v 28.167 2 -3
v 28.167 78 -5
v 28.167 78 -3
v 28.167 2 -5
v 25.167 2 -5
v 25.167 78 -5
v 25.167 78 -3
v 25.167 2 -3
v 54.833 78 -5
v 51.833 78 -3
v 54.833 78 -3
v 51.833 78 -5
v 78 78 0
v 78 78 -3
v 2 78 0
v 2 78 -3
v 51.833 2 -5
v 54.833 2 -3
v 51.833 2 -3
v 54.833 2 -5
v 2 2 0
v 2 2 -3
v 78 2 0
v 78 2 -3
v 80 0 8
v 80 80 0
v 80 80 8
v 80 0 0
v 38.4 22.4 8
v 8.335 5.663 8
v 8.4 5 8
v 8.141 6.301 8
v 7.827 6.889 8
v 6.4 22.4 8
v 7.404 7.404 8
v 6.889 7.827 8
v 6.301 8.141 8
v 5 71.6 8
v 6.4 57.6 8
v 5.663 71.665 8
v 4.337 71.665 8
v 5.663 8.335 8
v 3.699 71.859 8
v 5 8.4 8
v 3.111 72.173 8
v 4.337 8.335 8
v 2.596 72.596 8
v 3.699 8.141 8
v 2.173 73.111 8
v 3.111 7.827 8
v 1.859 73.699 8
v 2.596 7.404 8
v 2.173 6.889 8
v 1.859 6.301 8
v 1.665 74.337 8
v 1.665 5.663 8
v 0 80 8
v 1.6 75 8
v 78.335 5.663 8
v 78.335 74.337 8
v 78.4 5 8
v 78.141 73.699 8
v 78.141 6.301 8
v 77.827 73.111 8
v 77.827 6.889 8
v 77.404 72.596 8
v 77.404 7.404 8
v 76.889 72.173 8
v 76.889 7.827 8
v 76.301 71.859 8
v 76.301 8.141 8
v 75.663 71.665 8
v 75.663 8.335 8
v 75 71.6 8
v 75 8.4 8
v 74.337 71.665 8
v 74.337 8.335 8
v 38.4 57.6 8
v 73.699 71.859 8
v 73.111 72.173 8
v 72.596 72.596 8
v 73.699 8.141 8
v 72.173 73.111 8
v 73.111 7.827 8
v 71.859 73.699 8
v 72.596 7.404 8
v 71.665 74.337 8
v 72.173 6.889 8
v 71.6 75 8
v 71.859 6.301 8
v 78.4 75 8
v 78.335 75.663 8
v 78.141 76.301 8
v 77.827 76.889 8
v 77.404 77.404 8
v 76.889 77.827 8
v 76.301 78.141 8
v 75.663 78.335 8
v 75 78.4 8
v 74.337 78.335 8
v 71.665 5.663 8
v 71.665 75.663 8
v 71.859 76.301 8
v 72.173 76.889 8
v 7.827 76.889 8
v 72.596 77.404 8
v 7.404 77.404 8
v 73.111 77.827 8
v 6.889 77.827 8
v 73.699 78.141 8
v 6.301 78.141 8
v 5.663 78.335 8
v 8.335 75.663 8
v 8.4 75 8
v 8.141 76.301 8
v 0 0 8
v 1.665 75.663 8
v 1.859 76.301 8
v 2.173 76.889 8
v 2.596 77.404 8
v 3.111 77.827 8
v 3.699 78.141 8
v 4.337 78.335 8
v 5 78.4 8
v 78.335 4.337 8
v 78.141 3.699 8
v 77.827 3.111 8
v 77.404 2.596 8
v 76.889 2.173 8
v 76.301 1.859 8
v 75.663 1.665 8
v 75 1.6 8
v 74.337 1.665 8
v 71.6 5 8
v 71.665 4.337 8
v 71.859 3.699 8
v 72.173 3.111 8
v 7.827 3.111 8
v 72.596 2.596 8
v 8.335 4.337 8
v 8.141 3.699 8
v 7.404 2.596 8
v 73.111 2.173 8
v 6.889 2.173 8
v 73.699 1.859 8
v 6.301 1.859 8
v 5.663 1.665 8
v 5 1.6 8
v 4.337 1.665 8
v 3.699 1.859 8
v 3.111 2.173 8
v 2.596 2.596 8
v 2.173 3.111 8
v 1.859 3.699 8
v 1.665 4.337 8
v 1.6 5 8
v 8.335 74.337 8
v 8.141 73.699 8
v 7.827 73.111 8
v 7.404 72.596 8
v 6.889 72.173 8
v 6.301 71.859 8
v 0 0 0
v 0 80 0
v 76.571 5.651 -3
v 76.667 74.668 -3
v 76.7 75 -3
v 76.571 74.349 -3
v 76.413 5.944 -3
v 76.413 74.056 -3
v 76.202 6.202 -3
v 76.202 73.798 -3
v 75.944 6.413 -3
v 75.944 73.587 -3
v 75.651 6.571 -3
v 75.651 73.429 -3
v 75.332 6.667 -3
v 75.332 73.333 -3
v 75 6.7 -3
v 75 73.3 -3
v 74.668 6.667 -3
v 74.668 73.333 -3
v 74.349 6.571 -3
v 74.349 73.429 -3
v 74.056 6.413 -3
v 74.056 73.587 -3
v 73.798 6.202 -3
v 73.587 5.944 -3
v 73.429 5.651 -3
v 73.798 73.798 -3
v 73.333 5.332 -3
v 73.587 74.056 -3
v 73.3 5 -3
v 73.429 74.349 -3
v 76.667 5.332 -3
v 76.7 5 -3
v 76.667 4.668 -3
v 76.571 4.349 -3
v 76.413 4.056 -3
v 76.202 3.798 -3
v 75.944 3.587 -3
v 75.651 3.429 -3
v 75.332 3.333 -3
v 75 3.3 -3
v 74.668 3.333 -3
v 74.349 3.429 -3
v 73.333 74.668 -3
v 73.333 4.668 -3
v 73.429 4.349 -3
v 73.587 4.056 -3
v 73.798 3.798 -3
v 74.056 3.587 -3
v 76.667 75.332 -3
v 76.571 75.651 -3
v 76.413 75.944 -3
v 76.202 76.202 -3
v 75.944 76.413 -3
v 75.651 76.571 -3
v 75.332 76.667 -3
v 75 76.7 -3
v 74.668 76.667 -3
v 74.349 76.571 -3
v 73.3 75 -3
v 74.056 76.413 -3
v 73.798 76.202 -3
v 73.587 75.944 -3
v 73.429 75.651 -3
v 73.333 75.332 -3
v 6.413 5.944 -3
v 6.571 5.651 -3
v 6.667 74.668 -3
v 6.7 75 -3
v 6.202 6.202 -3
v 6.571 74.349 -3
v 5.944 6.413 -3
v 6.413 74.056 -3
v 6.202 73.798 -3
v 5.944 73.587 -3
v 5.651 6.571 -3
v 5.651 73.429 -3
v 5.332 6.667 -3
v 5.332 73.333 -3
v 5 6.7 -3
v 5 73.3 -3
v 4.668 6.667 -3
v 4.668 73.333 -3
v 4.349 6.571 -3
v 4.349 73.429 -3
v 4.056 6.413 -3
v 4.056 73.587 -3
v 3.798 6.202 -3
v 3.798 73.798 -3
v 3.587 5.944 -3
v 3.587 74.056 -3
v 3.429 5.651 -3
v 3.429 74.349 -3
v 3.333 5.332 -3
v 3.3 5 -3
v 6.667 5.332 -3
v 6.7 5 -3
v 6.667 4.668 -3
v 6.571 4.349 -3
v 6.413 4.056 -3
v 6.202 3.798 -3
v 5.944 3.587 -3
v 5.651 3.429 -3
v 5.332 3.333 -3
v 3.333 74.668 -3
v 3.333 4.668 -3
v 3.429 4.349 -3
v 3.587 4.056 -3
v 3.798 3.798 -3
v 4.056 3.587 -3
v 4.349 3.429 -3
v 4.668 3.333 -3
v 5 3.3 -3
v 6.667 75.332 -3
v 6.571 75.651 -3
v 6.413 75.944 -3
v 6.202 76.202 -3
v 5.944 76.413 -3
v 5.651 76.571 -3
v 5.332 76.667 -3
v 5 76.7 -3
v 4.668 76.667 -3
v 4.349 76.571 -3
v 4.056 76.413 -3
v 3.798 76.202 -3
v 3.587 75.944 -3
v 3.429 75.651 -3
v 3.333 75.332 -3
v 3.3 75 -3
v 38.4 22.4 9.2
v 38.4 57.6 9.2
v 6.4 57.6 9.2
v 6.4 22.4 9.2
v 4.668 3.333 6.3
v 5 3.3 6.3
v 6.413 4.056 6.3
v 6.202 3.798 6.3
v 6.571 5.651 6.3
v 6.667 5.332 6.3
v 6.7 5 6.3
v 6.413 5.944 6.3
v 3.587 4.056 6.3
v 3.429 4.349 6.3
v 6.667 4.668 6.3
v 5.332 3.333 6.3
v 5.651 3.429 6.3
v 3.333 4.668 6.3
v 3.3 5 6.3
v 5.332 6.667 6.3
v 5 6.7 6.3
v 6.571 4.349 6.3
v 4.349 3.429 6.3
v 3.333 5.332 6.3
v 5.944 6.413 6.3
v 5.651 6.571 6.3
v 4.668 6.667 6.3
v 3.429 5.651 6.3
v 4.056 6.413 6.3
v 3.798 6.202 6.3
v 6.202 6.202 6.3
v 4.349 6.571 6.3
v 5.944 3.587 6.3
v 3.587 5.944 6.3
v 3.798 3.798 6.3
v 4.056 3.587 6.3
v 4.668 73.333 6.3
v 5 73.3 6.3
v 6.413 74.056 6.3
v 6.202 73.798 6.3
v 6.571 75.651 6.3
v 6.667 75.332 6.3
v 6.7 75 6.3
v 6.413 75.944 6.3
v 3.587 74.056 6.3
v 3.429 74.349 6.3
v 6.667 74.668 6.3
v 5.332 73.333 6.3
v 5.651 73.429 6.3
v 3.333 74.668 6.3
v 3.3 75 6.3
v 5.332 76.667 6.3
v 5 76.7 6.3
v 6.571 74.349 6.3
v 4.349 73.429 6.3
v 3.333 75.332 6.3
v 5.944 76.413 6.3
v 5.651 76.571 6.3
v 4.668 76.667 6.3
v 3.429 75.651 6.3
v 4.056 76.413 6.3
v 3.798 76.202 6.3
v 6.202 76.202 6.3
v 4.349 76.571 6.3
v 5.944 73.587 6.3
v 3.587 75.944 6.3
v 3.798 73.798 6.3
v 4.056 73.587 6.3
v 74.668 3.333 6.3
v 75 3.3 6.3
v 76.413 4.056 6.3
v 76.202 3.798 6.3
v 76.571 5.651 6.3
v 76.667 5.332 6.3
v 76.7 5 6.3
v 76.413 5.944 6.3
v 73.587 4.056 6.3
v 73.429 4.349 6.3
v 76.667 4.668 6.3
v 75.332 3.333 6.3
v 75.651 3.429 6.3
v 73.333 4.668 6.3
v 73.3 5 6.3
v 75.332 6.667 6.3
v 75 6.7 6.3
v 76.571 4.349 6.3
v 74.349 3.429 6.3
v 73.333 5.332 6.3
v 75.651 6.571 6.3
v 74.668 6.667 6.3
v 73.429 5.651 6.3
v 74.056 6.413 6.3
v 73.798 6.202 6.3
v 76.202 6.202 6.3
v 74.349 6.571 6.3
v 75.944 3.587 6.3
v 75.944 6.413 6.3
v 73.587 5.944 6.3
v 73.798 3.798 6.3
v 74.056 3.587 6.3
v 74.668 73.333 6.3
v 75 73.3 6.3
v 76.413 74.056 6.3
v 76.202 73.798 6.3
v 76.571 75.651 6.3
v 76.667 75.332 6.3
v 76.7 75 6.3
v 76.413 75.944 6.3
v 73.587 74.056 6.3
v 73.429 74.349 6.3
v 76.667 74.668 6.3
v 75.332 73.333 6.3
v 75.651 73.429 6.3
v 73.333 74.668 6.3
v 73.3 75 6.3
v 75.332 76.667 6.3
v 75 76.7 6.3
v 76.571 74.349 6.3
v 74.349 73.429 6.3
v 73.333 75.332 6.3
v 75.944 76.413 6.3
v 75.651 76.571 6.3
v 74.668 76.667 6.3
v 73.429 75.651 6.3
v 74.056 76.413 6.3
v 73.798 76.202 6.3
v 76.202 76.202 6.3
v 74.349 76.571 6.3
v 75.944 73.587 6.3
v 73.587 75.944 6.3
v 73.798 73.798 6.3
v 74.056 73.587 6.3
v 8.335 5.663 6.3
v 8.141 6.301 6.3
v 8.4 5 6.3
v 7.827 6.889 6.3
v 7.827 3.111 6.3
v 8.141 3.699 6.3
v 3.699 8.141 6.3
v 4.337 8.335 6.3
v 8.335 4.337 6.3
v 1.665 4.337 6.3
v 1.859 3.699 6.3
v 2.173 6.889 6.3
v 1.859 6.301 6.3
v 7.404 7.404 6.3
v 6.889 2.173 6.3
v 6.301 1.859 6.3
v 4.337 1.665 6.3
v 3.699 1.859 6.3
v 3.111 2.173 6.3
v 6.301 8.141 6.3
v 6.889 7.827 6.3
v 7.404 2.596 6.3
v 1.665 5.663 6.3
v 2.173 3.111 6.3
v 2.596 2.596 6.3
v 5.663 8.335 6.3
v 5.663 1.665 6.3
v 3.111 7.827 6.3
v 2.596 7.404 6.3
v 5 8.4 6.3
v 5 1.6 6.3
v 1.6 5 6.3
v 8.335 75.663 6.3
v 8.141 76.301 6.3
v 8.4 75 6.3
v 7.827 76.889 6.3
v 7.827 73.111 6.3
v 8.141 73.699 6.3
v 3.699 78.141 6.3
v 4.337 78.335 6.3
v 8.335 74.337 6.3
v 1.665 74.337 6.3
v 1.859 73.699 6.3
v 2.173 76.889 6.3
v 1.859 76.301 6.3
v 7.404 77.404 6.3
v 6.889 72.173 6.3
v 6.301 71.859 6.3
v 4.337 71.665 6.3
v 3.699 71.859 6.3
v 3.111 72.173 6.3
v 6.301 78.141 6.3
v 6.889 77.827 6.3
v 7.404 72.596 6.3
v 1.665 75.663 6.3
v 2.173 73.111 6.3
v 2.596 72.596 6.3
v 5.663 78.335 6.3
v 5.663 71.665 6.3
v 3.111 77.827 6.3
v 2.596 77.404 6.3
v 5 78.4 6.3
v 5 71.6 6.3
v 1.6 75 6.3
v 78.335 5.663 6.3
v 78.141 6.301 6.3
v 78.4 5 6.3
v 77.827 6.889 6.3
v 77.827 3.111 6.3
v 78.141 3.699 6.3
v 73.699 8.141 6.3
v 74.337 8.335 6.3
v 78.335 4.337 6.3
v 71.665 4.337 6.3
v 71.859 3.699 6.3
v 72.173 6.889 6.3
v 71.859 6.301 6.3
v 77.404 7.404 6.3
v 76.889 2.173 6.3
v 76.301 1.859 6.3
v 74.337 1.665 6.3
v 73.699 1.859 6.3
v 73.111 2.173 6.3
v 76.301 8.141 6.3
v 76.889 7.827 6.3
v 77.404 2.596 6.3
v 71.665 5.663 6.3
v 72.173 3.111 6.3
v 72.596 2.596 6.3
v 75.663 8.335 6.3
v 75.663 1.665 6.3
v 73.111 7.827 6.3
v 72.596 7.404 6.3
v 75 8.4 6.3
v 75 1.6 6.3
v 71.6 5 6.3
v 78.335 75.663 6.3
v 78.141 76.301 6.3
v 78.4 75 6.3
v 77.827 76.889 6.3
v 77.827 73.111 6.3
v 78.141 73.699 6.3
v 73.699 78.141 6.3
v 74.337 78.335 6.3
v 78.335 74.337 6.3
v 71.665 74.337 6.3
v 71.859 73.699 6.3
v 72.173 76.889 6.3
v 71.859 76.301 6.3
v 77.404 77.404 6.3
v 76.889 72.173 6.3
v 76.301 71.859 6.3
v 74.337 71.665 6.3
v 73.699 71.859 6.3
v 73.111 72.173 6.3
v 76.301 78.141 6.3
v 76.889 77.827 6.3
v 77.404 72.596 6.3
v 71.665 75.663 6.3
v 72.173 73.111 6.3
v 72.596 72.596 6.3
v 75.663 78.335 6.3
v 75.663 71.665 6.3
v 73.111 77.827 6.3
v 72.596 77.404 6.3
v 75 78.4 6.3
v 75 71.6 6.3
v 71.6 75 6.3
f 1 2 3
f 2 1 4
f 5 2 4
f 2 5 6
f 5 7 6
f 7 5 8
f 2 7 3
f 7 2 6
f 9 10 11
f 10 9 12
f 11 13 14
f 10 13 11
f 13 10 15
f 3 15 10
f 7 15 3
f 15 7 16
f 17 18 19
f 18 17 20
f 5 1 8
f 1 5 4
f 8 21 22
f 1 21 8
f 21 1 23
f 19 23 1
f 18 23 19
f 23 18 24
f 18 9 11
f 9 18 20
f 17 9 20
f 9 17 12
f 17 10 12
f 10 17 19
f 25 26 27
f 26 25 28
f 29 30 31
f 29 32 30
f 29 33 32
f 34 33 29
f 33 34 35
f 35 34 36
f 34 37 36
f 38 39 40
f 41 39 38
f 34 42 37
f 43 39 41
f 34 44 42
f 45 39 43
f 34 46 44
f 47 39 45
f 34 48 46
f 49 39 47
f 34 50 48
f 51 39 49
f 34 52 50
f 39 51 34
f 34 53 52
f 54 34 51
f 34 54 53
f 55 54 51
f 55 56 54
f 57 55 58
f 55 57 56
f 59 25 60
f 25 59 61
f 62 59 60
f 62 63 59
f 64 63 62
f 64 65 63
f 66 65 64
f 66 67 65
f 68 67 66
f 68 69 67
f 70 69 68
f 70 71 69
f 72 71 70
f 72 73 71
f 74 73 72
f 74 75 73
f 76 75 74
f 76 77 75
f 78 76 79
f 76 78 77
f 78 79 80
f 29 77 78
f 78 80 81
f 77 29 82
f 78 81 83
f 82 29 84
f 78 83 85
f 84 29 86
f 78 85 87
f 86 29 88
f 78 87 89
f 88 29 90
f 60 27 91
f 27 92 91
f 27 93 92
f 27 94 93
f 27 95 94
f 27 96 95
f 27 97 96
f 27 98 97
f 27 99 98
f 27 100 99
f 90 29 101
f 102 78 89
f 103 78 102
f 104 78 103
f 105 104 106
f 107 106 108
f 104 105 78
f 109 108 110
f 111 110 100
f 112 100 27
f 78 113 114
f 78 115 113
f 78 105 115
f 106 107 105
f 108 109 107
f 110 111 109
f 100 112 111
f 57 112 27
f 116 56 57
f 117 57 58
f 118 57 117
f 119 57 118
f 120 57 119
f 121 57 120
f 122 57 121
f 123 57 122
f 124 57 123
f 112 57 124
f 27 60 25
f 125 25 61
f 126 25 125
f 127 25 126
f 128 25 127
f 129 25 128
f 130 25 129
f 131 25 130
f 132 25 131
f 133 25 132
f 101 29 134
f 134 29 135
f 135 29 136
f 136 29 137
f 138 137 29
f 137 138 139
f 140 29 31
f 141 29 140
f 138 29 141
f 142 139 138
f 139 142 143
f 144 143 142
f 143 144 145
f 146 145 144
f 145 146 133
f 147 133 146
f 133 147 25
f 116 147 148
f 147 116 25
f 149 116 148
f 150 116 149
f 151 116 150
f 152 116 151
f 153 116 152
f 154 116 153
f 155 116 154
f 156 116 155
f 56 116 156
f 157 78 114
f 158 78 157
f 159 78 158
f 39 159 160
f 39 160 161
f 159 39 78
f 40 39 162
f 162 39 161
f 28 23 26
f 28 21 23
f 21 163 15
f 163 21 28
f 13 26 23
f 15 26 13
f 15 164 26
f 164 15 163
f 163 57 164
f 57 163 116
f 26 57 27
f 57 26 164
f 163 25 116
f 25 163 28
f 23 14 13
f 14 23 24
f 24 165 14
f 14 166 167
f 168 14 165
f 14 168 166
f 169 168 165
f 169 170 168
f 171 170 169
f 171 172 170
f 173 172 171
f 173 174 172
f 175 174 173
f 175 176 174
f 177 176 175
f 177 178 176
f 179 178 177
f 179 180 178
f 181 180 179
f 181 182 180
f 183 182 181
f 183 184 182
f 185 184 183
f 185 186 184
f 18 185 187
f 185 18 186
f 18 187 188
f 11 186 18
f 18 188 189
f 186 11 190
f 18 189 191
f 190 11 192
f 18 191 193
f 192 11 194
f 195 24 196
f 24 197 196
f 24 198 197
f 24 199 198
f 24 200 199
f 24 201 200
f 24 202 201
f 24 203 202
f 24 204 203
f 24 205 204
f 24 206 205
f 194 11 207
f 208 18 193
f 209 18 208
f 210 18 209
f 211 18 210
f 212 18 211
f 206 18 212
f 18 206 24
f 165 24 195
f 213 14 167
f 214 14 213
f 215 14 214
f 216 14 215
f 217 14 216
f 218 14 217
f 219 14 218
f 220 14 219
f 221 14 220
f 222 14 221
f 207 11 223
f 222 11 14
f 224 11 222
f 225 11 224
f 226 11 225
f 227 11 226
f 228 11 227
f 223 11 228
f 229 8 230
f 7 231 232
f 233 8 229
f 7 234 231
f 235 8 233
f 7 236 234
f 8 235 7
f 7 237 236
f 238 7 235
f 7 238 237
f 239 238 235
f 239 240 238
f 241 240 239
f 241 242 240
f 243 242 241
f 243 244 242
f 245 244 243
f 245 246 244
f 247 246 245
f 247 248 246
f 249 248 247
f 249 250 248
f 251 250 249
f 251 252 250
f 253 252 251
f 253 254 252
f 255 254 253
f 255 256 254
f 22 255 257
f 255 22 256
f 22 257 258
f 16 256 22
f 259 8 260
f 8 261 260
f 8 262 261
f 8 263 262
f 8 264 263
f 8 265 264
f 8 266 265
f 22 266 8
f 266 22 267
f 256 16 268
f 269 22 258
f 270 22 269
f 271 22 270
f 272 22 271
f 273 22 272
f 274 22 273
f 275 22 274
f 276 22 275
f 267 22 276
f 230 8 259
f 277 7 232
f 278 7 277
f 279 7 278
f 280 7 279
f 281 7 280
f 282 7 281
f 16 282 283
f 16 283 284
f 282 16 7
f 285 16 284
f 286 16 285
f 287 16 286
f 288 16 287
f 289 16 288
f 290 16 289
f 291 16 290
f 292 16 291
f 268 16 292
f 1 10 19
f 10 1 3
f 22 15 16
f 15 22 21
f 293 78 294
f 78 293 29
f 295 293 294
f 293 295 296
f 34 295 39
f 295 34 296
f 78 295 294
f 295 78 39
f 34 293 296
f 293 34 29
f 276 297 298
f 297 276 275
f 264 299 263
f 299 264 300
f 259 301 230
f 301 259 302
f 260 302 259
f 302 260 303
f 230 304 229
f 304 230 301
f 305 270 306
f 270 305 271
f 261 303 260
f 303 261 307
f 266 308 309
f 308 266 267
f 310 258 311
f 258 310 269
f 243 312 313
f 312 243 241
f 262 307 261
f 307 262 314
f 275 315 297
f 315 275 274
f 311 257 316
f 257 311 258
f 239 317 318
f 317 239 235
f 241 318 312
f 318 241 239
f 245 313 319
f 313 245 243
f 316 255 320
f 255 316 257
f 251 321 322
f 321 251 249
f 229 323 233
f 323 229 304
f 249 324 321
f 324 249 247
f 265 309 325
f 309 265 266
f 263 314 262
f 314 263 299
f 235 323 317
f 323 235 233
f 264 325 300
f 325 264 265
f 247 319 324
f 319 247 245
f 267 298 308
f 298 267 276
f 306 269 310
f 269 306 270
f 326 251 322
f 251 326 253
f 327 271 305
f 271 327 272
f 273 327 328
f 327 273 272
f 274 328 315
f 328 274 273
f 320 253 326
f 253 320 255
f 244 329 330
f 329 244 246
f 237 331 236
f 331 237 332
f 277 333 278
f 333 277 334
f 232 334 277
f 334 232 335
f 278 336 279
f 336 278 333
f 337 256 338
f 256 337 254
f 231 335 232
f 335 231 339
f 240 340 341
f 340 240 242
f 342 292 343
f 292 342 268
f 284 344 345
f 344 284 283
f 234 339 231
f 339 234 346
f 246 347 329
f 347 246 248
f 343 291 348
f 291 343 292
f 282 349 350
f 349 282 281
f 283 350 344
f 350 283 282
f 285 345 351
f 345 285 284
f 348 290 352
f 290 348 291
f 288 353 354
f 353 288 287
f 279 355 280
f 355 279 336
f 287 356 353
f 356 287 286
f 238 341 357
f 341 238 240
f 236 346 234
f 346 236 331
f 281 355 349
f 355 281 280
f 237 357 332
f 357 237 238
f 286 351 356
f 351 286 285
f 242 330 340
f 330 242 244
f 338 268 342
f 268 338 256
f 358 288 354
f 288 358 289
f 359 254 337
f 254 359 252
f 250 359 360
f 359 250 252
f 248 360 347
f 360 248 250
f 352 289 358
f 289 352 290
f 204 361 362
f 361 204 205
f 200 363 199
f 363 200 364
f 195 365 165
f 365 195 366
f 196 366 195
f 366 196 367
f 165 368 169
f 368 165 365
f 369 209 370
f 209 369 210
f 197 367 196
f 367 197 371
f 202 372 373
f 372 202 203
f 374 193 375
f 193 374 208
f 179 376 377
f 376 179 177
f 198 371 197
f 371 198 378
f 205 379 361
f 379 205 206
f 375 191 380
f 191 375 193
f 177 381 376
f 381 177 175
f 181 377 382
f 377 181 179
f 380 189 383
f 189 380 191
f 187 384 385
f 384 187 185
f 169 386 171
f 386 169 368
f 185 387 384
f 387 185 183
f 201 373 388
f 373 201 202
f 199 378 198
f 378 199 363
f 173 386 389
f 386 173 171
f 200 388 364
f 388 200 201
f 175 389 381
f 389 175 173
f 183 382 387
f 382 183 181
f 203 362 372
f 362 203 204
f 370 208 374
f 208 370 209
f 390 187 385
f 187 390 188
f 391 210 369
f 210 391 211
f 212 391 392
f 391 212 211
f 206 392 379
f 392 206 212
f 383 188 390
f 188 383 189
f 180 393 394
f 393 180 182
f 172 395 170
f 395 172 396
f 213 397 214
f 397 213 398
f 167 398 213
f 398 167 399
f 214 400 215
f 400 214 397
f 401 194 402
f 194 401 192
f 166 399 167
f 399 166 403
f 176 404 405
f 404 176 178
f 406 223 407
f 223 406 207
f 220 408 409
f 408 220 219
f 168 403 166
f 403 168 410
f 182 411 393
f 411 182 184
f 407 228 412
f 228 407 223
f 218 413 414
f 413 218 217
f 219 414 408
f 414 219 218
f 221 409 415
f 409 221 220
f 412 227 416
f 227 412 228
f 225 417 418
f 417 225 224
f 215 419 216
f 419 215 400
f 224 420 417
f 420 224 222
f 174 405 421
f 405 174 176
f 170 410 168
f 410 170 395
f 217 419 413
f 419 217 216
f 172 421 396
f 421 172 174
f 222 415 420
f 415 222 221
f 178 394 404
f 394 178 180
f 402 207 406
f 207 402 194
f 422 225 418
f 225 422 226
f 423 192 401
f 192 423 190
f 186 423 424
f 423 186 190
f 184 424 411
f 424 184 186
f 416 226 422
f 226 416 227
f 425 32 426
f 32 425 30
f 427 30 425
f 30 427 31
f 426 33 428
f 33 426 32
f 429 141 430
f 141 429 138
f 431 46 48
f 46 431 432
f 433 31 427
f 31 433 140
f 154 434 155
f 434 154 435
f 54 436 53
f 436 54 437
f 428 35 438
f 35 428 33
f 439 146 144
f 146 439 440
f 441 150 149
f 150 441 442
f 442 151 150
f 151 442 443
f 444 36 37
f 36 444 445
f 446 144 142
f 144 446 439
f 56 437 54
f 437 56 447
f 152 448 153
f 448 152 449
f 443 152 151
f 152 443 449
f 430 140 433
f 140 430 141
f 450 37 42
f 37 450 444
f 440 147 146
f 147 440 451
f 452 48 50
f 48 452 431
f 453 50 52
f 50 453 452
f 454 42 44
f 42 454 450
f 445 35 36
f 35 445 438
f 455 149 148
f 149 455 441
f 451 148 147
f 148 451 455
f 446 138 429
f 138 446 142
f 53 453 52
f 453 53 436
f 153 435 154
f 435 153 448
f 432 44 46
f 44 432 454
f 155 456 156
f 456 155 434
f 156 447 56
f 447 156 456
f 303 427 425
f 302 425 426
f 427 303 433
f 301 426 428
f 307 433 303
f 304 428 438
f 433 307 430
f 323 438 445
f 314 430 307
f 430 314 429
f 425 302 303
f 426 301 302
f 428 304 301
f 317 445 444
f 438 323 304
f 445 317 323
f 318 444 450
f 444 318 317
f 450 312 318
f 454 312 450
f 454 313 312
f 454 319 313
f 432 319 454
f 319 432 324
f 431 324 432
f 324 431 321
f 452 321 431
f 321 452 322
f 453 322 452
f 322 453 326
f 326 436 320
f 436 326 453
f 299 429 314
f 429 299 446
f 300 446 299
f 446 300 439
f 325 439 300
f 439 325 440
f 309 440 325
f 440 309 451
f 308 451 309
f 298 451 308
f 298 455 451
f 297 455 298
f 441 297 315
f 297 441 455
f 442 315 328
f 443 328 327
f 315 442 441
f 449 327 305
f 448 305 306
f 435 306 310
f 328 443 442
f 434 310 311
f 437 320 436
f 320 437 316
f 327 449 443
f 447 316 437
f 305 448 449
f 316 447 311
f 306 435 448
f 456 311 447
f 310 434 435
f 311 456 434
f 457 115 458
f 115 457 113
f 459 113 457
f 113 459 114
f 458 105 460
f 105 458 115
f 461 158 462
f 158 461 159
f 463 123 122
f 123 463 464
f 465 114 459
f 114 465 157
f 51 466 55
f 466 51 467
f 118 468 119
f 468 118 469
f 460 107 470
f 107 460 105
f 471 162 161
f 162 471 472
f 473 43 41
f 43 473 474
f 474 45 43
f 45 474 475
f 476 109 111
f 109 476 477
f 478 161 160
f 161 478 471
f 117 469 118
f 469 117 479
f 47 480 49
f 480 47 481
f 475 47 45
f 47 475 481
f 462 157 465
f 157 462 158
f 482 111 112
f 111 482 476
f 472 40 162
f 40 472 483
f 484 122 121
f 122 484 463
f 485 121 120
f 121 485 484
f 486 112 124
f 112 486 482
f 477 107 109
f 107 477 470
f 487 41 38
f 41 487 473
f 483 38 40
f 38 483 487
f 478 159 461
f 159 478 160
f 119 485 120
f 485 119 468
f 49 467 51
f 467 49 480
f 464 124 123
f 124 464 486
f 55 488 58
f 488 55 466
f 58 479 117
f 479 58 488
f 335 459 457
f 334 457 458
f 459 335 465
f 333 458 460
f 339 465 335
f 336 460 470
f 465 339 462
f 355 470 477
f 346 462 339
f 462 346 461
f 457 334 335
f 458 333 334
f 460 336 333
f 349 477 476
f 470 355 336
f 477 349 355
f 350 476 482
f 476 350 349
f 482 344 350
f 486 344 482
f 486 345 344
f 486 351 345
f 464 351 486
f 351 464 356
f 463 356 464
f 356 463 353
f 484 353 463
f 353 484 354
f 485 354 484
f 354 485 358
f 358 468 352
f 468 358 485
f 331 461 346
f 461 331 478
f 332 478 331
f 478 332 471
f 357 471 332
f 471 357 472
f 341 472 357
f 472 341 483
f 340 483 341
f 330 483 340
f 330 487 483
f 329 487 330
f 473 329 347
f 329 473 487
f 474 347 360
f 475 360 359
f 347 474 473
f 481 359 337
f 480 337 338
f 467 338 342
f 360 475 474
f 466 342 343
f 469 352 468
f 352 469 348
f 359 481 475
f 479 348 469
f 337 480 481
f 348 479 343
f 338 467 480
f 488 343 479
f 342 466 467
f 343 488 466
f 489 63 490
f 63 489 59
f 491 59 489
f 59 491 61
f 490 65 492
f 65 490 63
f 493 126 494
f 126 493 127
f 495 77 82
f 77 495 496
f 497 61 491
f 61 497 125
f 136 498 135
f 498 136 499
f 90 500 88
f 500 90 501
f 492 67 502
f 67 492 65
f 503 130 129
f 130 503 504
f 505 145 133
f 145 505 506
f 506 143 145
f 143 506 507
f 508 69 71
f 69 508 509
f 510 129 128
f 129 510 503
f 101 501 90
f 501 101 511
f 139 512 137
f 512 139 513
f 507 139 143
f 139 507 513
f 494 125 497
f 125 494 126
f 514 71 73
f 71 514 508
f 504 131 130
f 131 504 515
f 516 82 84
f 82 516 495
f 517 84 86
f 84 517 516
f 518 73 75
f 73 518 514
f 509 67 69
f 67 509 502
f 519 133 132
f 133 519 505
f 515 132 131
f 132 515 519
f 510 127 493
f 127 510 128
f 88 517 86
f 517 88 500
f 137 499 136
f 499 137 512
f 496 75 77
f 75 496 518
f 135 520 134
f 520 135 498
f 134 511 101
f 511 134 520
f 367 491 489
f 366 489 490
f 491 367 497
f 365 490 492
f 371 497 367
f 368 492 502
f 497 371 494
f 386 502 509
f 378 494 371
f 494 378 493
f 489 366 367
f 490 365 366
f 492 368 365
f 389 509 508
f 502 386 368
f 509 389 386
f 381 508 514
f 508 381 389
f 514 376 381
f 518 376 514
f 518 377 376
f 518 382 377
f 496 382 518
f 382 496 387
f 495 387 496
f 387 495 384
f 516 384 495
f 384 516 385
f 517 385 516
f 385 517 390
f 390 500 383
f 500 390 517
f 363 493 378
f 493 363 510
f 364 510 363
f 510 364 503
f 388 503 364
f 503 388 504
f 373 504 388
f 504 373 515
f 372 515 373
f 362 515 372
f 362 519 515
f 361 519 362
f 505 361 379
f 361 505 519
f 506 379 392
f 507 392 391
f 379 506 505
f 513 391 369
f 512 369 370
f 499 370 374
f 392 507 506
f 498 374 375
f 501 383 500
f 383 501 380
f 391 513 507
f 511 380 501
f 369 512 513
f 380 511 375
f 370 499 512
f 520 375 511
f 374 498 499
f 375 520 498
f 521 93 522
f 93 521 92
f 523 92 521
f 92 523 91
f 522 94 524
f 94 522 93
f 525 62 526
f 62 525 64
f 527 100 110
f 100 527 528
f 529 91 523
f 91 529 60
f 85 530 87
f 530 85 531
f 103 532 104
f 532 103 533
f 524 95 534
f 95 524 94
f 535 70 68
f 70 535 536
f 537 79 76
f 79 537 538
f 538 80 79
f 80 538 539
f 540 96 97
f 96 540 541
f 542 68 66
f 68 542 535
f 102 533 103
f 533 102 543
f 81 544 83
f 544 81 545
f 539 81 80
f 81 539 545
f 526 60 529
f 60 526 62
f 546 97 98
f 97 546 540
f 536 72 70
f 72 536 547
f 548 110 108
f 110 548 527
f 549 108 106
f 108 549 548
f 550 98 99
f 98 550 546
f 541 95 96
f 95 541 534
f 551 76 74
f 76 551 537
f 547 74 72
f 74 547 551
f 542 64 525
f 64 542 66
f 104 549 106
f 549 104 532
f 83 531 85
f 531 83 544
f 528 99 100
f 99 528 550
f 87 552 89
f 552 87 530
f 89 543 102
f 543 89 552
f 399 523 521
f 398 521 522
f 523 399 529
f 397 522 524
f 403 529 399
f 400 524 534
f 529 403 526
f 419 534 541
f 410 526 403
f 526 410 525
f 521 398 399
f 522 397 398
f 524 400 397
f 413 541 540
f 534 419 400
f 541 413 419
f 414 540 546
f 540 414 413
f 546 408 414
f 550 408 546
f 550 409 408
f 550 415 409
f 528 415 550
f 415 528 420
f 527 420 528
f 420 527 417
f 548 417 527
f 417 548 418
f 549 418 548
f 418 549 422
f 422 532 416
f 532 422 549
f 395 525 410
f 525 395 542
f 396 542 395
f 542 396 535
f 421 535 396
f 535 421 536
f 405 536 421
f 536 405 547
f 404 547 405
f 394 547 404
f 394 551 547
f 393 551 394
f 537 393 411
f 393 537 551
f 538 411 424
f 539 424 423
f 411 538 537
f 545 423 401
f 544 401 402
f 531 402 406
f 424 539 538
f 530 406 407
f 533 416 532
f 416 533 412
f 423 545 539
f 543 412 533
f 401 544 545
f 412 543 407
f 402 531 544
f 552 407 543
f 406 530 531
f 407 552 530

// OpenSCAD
$fn = 32;

// ----------------------------------------------------------------------
// Enclosure lid: 80 x 80 x 8 mm, 4 bolt holes
// ----------------------------------------------------------------------

// --- parameters (mm) ---
length = 80;              // lid length, X
width = 80;               // lid width, Y
plate_t = 8;              // lid plate thickness
bolt_d = 3.4;             // bolt clearance
boss_lip = 5;             // bolt hole inset from the corner
sink = 1;                 // overlap of the lip and ribs into the plate
lip_h = 4;                // lip height below the plate
lip_wall = 2;             // lip wall thickness
cs_d = 6.8;               // countersink diameter
cs_h = 1.7;               // countersink depth
rib_n = 2;                // stiffening ribs
rib_t = 3;                // rib thickness
rib_h = 6;                // rib height below the plate
label_h = 1.2;            // raised marking pad

module plate() {
  cube([length, width, plate_t]);
  /* lip that drops into the housing opening, sunk into the plate */
  translate([lip_wall, lip_wall, -lip_h + sink]) cube([length - 2 * lip_wall, width - 2 * lip_wall, lip_h]);
  /* stiffening ribs under the plate */
  for (i = [1 : rib_n]) translate([length * i / (rib_n + 1) - rib_t / 2, lip_wall, -rib_h + sink]) cube([rib_t, width - 2 * lip_wall, rib_h]);
  /* raised marking pad on top, sunk 1 mm into the plate */
  translate([length * 0.08, width * 0.28, plate_t - 1]) cube([length * 0.4, width * 0.44, label_h + 1]);
}

difference() {
  plate();
  /* bolt pattern matching the corner bosses */
  for (sx = [0, 1]) for (sy = [0, 1])
    translate([sx * (length - 2 * boss_lip) + boss_lip, sy * (width - 2 * boss_lip) + boss_lip, -lip_h - 1])
      cylinder(h = plate_t + lip_h + 2, d = bolt_d);
  /* countersinks so the heads sit flush */
  for (sx = [0, 1]) for (sy = [0, 1])
    translate([sx * (length - 2 * boss_lip) + boss_lip, sy * (width - 2 * boss_lip) + boss_lip, plate_t - cs_h])
      cylinder(h = cs_h + 0.5, d = cs_d);
}
